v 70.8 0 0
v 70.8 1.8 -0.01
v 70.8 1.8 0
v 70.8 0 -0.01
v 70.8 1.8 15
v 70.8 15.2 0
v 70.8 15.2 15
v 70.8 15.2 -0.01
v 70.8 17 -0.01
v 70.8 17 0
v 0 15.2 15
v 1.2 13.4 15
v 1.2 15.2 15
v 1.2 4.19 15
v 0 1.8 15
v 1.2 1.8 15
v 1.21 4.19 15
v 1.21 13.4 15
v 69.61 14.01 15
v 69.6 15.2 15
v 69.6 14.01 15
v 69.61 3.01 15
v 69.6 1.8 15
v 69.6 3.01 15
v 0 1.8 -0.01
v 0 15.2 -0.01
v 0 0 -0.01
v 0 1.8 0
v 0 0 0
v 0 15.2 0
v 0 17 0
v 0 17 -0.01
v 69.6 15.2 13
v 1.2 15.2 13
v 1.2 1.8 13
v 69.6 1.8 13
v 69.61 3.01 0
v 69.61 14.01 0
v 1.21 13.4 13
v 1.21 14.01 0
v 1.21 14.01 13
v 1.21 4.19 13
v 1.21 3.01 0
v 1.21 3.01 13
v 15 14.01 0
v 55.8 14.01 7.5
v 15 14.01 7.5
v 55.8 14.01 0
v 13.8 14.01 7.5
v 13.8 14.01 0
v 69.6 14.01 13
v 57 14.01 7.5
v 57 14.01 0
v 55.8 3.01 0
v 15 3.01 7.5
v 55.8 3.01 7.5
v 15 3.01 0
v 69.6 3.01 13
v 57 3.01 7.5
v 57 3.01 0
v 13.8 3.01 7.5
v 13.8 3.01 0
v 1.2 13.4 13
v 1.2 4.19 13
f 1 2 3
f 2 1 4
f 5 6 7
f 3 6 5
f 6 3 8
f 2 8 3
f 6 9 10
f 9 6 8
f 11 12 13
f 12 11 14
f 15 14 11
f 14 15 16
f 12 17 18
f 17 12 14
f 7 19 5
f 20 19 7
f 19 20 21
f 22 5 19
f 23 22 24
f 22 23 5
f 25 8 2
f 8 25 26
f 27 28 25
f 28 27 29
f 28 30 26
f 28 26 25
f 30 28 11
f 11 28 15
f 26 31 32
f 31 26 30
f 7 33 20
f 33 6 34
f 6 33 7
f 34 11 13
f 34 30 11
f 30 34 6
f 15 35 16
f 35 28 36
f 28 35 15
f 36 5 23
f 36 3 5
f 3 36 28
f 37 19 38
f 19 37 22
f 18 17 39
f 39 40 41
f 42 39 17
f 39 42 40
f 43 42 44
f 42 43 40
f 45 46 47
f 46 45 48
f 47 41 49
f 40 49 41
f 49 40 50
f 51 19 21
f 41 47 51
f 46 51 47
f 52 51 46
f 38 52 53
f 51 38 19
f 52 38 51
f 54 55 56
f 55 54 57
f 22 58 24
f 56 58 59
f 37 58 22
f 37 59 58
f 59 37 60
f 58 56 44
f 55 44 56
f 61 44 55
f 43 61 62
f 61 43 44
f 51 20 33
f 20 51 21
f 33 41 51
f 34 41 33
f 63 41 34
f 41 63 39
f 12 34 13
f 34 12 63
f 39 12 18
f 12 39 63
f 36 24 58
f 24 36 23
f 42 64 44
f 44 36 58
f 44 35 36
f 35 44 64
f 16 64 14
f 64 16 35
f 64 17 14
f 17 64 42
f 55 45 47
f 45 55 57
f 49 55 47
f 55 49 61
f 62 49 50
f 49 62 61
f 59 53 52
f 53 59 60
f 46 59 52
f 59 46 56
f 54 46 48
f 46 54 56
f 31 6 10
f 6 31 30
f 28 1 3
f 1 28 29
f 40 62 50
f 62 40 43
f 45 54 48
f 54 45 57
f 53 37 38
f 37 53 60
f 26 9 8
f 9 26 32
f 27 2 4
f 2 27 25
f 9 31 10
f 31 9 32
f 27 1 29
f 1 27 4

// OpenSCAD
// file: ../Base/Boxes.scad
// Fischertechnik Box Foundation
// Pre-designed Boxes

use <Constants.scad>

include <PlacementOptions.scad>

box190Width = 190;
box190Depth = 130;
box130Width = 130;
box130Depth = 95;

// Values are from an original ec3 box
topBottomDifference = 1.5;
outerHeight = 40;
baseThickness = 1.8;
innerHeight = outerHeight - baseThickness;
stackExcess = 5.7;
radius = 3.5;
wallThickness = 1.5;
tolerance = 0.2;

boxWallThickness = wallThickness;
boxBaseThickness = baseThickness;
boxWebWidth = 3.0;

// getBoxWallThickness()
// Gets the wall thickness of a Fischertechnik Box
function getBoxWallThickness() = boxWallThickness;

// getBoxUsageHeight(height = 38.2)
// Gets the usable height of a Fischertechnik box
// height = Outer height of the box from the bottom to the upper edge.
function getBoxUsageHeight(height = outerHeight) = height - baseThickness - stackExcess;

// getBoxInnerHeight()
// Gets the inner height of a Fischertechnik box, including the stack excess
function getBoxInnerHeight() = innerHeight;

// getBoxBaseThickness()
// Gets the thickness of the Fischertechnik box base.
function getBoxBaseThickness() = boxBaseThickness;

// getBoxWebWidth()
// Gets the width of a box web
function getBoxWebWidth() = boxWebWidth;

// getBox190Space()
// Gets the usable inner space of a Box 190 as an x/y-list
function getBox190Space() = [
    box190Width - 2*getBoxWallThickness() - topBottomDifference, 
    box190Depth - 2*getBoxWallThickness() - topBottomDifference ];

// RoundedCornerPlate(width, depth, height, radius)
// Creates a body plate with rounded corners for a box. Used
// also to create the complete box with the hull module.
// width = Width of the plate
// depth = depth of the plate 
// height = thickness of the plate
// radius = radius of the rounded corner
module RoundedCornerPlate(width, depth, height, radius) {
    translate([radius, radius])
    hull() {
        w = width-2*radius;
        d = depth-2*radius;
        cube([w, d, height]);
        cylinder(height, r=radius, $fn=getFragments());
        translate([w, 0])
            cylinder(height, r=radius, $fn=getFragments());
        translate([w, d])
            cylinder(height, r=radius, $fn=getFragments());
        translate([0, d])
            cylinder(height, r=radius, $fn=getFragments());
    }
}

// BoxBase(width, depth)
// Creates an empty stackable Fischertechnik compatible box
// width = Outer width of the box (190, 130, ...)
// depth = Outer depth of the box (130, 95, ...)

module BoxBase(width, depth, height=outerHeight) {    
    thinPlate = 0.01;

    innerHeight = height - baseThickness;    
    
    module Body(tolerance=tolerance) {
        hull() {
            // Bottom with tolerance to fit into the original boxes when stacked
            translate([-wallThickness+tolerance, -wallThickness+tolerance, -baseThickness])
                RoundedCornerPlate(width-topBottomDifference-2*tolerance, depth-topBottomDifference-2*tolerance, thinPlate, radius);
            
            // Top
            translate([-wallThickness-topBottomDifference/2, -wallThickness-topBottomDifference/2, innerHeight-thinPlate])
                RoundedCornerPlate(width, depth, thinPlate, radius);
         }
    }

    module Cutoff() {
        hull() {
            coWidth = width - 2*wallThickness;
            coDepth = depth - 2*wallThickness;
            
            // Bottom
            RoundedCornerPlate(coWidth-topBottomDifference, coDepth-topBottomDifference, thinPlate, radius);

            // Top
            translate([-topBottomDifference/2, -topBottomDifference/2, innerHeight+thinPlate]) 
                RoundedCornerPlate(coWidth, coDepth, thinPlate, radius);
        }
    }
    
    difference() {        
        Body();
        Cutoff();
        stackOffset = innerHeight - stackExcess;
        translate([0, 0, stackOffset + baseThickness])
            Body(tolerance=0);
    }
}

// Creates the Fischertechnik empty box 130x190 mm and places it at position 0,0
// 190x130 are the outer sizes, the inner space is slightly smaller. Use getBox190Space() to get the inner sizes.
// The box is positioned that the usable inner space is at the 0,0,0 position.

module Box190() {
    BoxBase(box190Width, box190Depth);
}

// Gets the usable inner space of a Box 130 as an x/y-list
function getBox130Space() = [
    box130Width - 2*getBoxWallThickness() - topBottomDifference, 
    box130Depth - 2*getBoxWallThickness() - topBottomDifference ];

// Creates the Fischertechnik empty box 95x130 mm and places it at position 0,0
// 190x130 are the outer sizes, the inner space is slightly smaller. Use getBox190Space() to get the inner sizes.
// The box is positioned that the usable inner space is at the 0,0,0 position.

module Box130() {
    BoxBase(box130Width, box130Depth);
}

// Creates a web at the specified box walls
// corner 0 = LowerLeft, 1 = UpperLeft, 2 = UpperRight, 3 = LowerRight
// side 0 = LeftOfCorner, 1 = RightOfCorner
// distance = Distance in mm from the corner
// boxSpace = inner width and depth of the box (default: Box 190)
// webWidth = length of the web (default is 3 mms)
// webThickness = thickness of the web (default is 1 mm)
// height = Height of the web (standard is getBoxUsageHeight())
// sink = How much of the web is sunk into the wall

module BoxWeb(
    corner, 
    side, 
    distance, 
    boxSpace=getBox190Space(), 
    webWidth=getBoxWebWidth(), 
    webThickness=1.0, 
    height=getBoxUsageHeight(),
    sink = getBoxWallThickness()/2) {
    width = (corner % 2 == 0) ? 
            (side == LeftOfCorner ? webWidth : webThickness) :
            (side == LeftOfCorner ? webThickness : webWidth);

    depth = (corner % 2 == 0) ? 
            (side == RightOfCorner ? webWidth : webThickness) :
            (side == RightOfCorner ? webThickness : webWidth);
    
    xDiff = corner == LowerLeft ? 
                (side == LeftOfCorner ? -sink : distance) :
            (corner == UpperLeft ?                
                (side == LeftOfCorner ? distance : -sink) :
            (corner == UpperRight ?
                (side == LeftOfCorner ? boxSpace.x-webWidth+sink : boxSpace.x-distance-webThickness) :
                (side == LeftOfCorner ? boxSpace.x-distance-webThickness: boxSpace.x-webWidth+sink)));

    yDiff = corner == LowerLeft ? 
                (side == RightOfCorner ? -sink : distance) :
            (corner == UpperLeft ?
                (side == RightOfCorner ? boxSpace.y-distance-webThickness : boxSpace.y-webWidth+sink) :
            (corner == UpperRight ?
                (side == RightOfCorner ? boxSpace.y-webWidth+sink : boxSpace.y-distance-webThickness) :
                (side == RightOfCorner ? distance : -sink)));
    
    translate([xDiff, yDiff, -getExcess()])
        cube([width, depth, height + 2*getExcess()]);
}
// file: ../Base/Rotation.scad
// Fischertechnik Box Foundation
// Geometry Helpers Rotation

include <PlacementOptions.scad>

// getRotatedSpace(space, rotation=NoRotation)
// Rotates the space dependent on the specified rotation

function getRotatedSpace(space, rotation=NoRotation) = [
    (rotation == Rotate90 || rotation == Rotate270) ? space.y : space.x,
    (rotation == Rotate90 || rotation == Rotate270) ? space.x : space.y
];

// Rotates the given space around the fixed left lower corner
// space = the space the children needs as width/depth list [width,depth]
// rotation = 0 Rotate0 degrees, 1 Rotate90 degrees, 2 Rotate180 degrees, 3 Rotate270 degrees (equivalent to -90)

module RotateFix(space, rotation=NoRotation) {
    dy = (rotation == Rotate0 || rotation == Rotate270) ? 0 :
        (rotation == Rotate90) ? space.x :
        space.y;
    dx = (rotation < Rotate180) ? 0 :
        (rotation == Rotate180) ? space.x :
        space.y;
    
    translate([dx, dy, 0])
        rotate([0, 0, rotations[rotation]])
            children();
}
// file: ../Base/Alignment.scad
// Fischertechnik Box Foundation
// Geometry Helpers Alignment

include <PlacementOptions.scad>

// getAlignedX(elementWidth, spaceWidth, align=AlignRight, offset=0)
// Gets the aligned X offset of an element with the given
// width in the given space.
// elementWidth = The width of the element to positon
// spaceWidth = The space where the element should be aligned
// align = 0 AlignLeft, 1 AlignCenter, 2 AlignRight
// offset = an optional offset from the aligned position. When
// aligned left or centered, then positive values are in X direction.
// When aligned right then positive values are in negative X direction.

function getAlignedX(elementWidth, spaceWidth, align=AlignRight, offset=0) =
    (align == AlignLeft) ?
        offset :
        ((align == AlignCenter) ?
        (spaceWidth - elementWidth)/2 + offset :
        spaceWidth - offset - elementWidth);

// getAlignedY(elementDepth, spaceDepth, align=AlignTop, offset=0)
// Gets the aligned Y offset of an element with the given
// depth in the given space.
// elementDepth = The depth of the element to positon
// spaceDepth = The space where the element should be aligned
// align = 0 AlignBottom, 1 AlignCenter, 2 AlignTop
// offset = an optional offset from the aligned position. When
// aligned bottom or centered, then positive values are in Y direction.
// When aligned top then positive values are in negative Y direction.

function getAlignedY(elementDepth, spaceDepth, align=AlignTop, offset=0) =
    (align == AlignBottom) ?
        offset :
        ((align == AlignCenter) ?
        (spaceDepth - elementDepth)/2 + offset :
        spaceDepth - offset - elementDepth);
// file: ../Base/PlacementOptions.scad
// Fischertechnik Box Foundation
// Placement Options

// Alignment
NoAlign = 0;
AlignLeft = 1;
AlignBottom = 2;
AlignCenter = 3;
AlignRight = 4;
AlignTop = 5;

// Element rotation degree steps
rotations = [0, -90, -180, -270];

// Rotation
NoRotation = 0;
Rotate0 = 0;
Rotate90 = 1;
Rotate180 = 2;
Rotate270 = 3;

// Docking (seen from above)
NoDock = -1;
DockLeft = 0;
DockTop = 1;
DockRight = 2;
DockCorner = 2;
DockBottom = 3;

// Web corners
LowerLeft = 0;
UpperLeft = 1;
UpperRight = 2;
LowerRight = 3;

// Web position relative to corner
LeftOfCorner = 0;
RightOfCorner = 1;

// Rails direction
Horizontal = true;
Vertical = false;
// file: ../Base/Placement.scad
// Fischertechnik Box Foundation
// Geometry Helpers Placement

use <Constants.scad>
use <Alignment.scad>
use <Rotation.scad>
use <Boxes.scad>

include <PlacementOptions.scad>

// Place(x=0, y=0, elementSpace=[0,0], alignX=AlignLeft, alignY=AlignBottom, rotation=Rotate0, boxSpace=getBox190Space())
// Places the child at the specified position
// y = Y-Position. This is a relative position when an X aligment is specified.
// x = X-Position. This is a relative position when an Y aligment is specified.
// elementSpace = space of the element to be placed [x,y]
// alignX = -1=NoAlign, 0 AlignLeft, 1 AlignCenter, 3 AlignRight (elementSpace and boxSpace required!)
// alignY = -1=NoAlign, 2 AlignBottom, 1 AlignCenter, 4 AlignTop (elementSpace and boxSpace required!)
// rotation = 0 Rotate0 0 degrees, 1 Rotate90 90 degrees, 
// 2 Rotate180 180 degrees, 3 Rotate270 270 degrees (equivalent to -90)
// boxSpace = Inner space of the box where the placement occurs [x,y] - default is Box 190x130 inner space

module Place(x=0, y=0, elementSpace=[0,0], 
  alignX=AlignLeft, alignY=AlignBottom, 
  rotation=NoRotation, boxSpace=getBox190Space()) {

    module Position(x, y, space, rotation=Rotate0) {
        translate([x, y, 0])
            RotateFix(space, rotation)
                children();
    }

    space = getRotatedSpace(elementSpace, rotation);
    alignedX = getAlignedX(space.x, boxSpace.x, alignX, x);
    alignedY = getAlignedY(space.y, boxSpace.y, alignY, y);
    Position(alignedX, alignedY, elementSpace, rotation)
        children();
}

// Center(space=getBox130Space(), elementSpace=[0,0])
// space = Space where the children is centered. For cylinder use centered=true and no elementSpace.
// elementSpace = space of the element to be centered [x,y]

module Center(space=getBox190Space(), elementSpace=[0,0]) {
    Place(elementSpace=elementSpace, boxSpace=space, alignX=AlignCenter, alignY=AlignCenter)
        children();
}

// CenterHorizontal(width=0, y=0, offset=0, space=getBox130Space())
// width = Width of the element to be placed.
// y = Y position of the element
// offset = Offset from the center position (negative will be left of the center)
// space = Space where the element is placed

module CenterHorizontal(width=0, y=0, offset=0, space=getBox190Space()) {
    Place(x=offset, y=y, elementSpace=[width, 0], boxSpace=space, alignX=AlignCenter)
        children(0);
}

// CenterVertical(depth=0, x=0, offset=0, space=getBox130Space())
// depth = Depth of the element to be placed.
// x = X position of the element
// offset = Offset from the center position (negative will be down of the center)
// space = Space where the element is placed

module CenterVertical(depth=0, x=0, offset=0, space=getBox190Space()) {
    Place(x=x, y=offset, elementSpace=[0, depth], boxSpace=space, alignY=AlignCenter)
        children(0);
}

// getIsVertical(align)
// True if the specified alignment needs a vertical orientation for a divider (AlignRight, AlignLeft)

function getIsVertical(align) = (align == AlignRight || align == AlignLeft);

// getIsHorizontal(align)
// True if the specified alignment needs a horizontal orientation for a divider (AlignTop, AlignBottom)

function getIsHorizontal(align) = (align == AlignTop || align == AlignBottom);
// file: ../Base/Constants.scad
// Fischertechnik Box Foundation
// Constants

// Constant values necessary for multiple elements

// Base constants
dividerThickness = 1.2;
excess = 0.01;
fragments = 90;
tolerance = 0.8;

// Gets the thickness of a divider 
function getDividerThickness() = dividerThickness;

// Gets the excess that is used to merge walls into each other
function getExcess() = excess;

// Gets amount of fragments of a cylinder
function getFragments() = fragments;

// Gets the inner tolerance of a frame to each side
function getTolerance() = tolerance;


// Fischertechnik specific constants
axisDiameter = 4;
axisBottomDiameter = axisDiameter + 1;
axisTolerance = 0.2;

// Gets axis diameter of Fischertechnik axis
function getAxisDiameter() = axisDiameter;

// Gets axis diameter tolerance (subtracted for element axis)
function getAxisTolerance() = axisTolerance;

// Gets the axis diameter for standing axis
function getStandAxisDiameter() = getAxisDiameter() - getAxisTolerance();

// Gets axis bottom diameter for thicker part at the bottom
function getAxisBottomDiameter() = axisBottomDiameter;

pinHeight = 2.5;
pinTolerance = 0.2;

// gets the height of a connecting pin
function getPinHeight() = pinHeight;

// gets the connecting pin height tolerance
function getPinTolerance() = pinTolerance;

standardEdgeDistance = 2.5;
standardWebDistance = 11.5;
standardCornerLength = 15;

// gets the standard distance to the wall of the box for dockable frames with webs
function getStandardEdgeDistance() = standardEdgeDistance;

// gets the standard distance of each web to the corner of the dockable frame
function getStandardWebDistance() = standardWebDistance;

// gets the standard length of the corner walls of a dockable frame
function getStandardCornerLength() = standardCornerLength;

tubeWallFactor = 0.8;

// gets the wall thickness of a tube.
function getTubeWallThickness() = tubeWallFactor * getDividerThickness();

smallPartsFrameHeight = 20;

// gets the frame height for docked small parts boxes.
function getSmallPartsFrameHeight() = smallPartsFrameHeight;

hubRingDiameter = 19.5;
hubRingLevelDiameter = 21;

// gets the diameter of a tube matching the inner ring of a wheel
function getHubRingDiameter() = hubRingDiameter;

// gets the diameter of a hub tube with a thicker diameter
function getHubRingLevelDiameter() = hubRingLevelDiameter;
// main file
// Fischertechnik Box Library
// Frame for gear rack 60 for mini-motor lifting gear
// 37451

use <../ModelBase/Complex.scad>

/* [Hidden] */
width = 60;

// getFrameGearRack60Space()
// Gets the space of a frame for the gear rack 30 for mini-motor lifting gear
// dock = true, if the frame should be docked to the wall at the left side

function getFrameGearRack60Space(dock=false) = getGearRackSpace(width, dock);

// FrameGearRack60()
// Frame for the gear rack 60 for mini-motor lifting gear
// dock = true, if the frame should be docked to the wall at the left side

module FrameGearRack60(dock=false) {
    GearRack(width, dock);
}

// test
color("lightgray")
FrameGearRack60();
